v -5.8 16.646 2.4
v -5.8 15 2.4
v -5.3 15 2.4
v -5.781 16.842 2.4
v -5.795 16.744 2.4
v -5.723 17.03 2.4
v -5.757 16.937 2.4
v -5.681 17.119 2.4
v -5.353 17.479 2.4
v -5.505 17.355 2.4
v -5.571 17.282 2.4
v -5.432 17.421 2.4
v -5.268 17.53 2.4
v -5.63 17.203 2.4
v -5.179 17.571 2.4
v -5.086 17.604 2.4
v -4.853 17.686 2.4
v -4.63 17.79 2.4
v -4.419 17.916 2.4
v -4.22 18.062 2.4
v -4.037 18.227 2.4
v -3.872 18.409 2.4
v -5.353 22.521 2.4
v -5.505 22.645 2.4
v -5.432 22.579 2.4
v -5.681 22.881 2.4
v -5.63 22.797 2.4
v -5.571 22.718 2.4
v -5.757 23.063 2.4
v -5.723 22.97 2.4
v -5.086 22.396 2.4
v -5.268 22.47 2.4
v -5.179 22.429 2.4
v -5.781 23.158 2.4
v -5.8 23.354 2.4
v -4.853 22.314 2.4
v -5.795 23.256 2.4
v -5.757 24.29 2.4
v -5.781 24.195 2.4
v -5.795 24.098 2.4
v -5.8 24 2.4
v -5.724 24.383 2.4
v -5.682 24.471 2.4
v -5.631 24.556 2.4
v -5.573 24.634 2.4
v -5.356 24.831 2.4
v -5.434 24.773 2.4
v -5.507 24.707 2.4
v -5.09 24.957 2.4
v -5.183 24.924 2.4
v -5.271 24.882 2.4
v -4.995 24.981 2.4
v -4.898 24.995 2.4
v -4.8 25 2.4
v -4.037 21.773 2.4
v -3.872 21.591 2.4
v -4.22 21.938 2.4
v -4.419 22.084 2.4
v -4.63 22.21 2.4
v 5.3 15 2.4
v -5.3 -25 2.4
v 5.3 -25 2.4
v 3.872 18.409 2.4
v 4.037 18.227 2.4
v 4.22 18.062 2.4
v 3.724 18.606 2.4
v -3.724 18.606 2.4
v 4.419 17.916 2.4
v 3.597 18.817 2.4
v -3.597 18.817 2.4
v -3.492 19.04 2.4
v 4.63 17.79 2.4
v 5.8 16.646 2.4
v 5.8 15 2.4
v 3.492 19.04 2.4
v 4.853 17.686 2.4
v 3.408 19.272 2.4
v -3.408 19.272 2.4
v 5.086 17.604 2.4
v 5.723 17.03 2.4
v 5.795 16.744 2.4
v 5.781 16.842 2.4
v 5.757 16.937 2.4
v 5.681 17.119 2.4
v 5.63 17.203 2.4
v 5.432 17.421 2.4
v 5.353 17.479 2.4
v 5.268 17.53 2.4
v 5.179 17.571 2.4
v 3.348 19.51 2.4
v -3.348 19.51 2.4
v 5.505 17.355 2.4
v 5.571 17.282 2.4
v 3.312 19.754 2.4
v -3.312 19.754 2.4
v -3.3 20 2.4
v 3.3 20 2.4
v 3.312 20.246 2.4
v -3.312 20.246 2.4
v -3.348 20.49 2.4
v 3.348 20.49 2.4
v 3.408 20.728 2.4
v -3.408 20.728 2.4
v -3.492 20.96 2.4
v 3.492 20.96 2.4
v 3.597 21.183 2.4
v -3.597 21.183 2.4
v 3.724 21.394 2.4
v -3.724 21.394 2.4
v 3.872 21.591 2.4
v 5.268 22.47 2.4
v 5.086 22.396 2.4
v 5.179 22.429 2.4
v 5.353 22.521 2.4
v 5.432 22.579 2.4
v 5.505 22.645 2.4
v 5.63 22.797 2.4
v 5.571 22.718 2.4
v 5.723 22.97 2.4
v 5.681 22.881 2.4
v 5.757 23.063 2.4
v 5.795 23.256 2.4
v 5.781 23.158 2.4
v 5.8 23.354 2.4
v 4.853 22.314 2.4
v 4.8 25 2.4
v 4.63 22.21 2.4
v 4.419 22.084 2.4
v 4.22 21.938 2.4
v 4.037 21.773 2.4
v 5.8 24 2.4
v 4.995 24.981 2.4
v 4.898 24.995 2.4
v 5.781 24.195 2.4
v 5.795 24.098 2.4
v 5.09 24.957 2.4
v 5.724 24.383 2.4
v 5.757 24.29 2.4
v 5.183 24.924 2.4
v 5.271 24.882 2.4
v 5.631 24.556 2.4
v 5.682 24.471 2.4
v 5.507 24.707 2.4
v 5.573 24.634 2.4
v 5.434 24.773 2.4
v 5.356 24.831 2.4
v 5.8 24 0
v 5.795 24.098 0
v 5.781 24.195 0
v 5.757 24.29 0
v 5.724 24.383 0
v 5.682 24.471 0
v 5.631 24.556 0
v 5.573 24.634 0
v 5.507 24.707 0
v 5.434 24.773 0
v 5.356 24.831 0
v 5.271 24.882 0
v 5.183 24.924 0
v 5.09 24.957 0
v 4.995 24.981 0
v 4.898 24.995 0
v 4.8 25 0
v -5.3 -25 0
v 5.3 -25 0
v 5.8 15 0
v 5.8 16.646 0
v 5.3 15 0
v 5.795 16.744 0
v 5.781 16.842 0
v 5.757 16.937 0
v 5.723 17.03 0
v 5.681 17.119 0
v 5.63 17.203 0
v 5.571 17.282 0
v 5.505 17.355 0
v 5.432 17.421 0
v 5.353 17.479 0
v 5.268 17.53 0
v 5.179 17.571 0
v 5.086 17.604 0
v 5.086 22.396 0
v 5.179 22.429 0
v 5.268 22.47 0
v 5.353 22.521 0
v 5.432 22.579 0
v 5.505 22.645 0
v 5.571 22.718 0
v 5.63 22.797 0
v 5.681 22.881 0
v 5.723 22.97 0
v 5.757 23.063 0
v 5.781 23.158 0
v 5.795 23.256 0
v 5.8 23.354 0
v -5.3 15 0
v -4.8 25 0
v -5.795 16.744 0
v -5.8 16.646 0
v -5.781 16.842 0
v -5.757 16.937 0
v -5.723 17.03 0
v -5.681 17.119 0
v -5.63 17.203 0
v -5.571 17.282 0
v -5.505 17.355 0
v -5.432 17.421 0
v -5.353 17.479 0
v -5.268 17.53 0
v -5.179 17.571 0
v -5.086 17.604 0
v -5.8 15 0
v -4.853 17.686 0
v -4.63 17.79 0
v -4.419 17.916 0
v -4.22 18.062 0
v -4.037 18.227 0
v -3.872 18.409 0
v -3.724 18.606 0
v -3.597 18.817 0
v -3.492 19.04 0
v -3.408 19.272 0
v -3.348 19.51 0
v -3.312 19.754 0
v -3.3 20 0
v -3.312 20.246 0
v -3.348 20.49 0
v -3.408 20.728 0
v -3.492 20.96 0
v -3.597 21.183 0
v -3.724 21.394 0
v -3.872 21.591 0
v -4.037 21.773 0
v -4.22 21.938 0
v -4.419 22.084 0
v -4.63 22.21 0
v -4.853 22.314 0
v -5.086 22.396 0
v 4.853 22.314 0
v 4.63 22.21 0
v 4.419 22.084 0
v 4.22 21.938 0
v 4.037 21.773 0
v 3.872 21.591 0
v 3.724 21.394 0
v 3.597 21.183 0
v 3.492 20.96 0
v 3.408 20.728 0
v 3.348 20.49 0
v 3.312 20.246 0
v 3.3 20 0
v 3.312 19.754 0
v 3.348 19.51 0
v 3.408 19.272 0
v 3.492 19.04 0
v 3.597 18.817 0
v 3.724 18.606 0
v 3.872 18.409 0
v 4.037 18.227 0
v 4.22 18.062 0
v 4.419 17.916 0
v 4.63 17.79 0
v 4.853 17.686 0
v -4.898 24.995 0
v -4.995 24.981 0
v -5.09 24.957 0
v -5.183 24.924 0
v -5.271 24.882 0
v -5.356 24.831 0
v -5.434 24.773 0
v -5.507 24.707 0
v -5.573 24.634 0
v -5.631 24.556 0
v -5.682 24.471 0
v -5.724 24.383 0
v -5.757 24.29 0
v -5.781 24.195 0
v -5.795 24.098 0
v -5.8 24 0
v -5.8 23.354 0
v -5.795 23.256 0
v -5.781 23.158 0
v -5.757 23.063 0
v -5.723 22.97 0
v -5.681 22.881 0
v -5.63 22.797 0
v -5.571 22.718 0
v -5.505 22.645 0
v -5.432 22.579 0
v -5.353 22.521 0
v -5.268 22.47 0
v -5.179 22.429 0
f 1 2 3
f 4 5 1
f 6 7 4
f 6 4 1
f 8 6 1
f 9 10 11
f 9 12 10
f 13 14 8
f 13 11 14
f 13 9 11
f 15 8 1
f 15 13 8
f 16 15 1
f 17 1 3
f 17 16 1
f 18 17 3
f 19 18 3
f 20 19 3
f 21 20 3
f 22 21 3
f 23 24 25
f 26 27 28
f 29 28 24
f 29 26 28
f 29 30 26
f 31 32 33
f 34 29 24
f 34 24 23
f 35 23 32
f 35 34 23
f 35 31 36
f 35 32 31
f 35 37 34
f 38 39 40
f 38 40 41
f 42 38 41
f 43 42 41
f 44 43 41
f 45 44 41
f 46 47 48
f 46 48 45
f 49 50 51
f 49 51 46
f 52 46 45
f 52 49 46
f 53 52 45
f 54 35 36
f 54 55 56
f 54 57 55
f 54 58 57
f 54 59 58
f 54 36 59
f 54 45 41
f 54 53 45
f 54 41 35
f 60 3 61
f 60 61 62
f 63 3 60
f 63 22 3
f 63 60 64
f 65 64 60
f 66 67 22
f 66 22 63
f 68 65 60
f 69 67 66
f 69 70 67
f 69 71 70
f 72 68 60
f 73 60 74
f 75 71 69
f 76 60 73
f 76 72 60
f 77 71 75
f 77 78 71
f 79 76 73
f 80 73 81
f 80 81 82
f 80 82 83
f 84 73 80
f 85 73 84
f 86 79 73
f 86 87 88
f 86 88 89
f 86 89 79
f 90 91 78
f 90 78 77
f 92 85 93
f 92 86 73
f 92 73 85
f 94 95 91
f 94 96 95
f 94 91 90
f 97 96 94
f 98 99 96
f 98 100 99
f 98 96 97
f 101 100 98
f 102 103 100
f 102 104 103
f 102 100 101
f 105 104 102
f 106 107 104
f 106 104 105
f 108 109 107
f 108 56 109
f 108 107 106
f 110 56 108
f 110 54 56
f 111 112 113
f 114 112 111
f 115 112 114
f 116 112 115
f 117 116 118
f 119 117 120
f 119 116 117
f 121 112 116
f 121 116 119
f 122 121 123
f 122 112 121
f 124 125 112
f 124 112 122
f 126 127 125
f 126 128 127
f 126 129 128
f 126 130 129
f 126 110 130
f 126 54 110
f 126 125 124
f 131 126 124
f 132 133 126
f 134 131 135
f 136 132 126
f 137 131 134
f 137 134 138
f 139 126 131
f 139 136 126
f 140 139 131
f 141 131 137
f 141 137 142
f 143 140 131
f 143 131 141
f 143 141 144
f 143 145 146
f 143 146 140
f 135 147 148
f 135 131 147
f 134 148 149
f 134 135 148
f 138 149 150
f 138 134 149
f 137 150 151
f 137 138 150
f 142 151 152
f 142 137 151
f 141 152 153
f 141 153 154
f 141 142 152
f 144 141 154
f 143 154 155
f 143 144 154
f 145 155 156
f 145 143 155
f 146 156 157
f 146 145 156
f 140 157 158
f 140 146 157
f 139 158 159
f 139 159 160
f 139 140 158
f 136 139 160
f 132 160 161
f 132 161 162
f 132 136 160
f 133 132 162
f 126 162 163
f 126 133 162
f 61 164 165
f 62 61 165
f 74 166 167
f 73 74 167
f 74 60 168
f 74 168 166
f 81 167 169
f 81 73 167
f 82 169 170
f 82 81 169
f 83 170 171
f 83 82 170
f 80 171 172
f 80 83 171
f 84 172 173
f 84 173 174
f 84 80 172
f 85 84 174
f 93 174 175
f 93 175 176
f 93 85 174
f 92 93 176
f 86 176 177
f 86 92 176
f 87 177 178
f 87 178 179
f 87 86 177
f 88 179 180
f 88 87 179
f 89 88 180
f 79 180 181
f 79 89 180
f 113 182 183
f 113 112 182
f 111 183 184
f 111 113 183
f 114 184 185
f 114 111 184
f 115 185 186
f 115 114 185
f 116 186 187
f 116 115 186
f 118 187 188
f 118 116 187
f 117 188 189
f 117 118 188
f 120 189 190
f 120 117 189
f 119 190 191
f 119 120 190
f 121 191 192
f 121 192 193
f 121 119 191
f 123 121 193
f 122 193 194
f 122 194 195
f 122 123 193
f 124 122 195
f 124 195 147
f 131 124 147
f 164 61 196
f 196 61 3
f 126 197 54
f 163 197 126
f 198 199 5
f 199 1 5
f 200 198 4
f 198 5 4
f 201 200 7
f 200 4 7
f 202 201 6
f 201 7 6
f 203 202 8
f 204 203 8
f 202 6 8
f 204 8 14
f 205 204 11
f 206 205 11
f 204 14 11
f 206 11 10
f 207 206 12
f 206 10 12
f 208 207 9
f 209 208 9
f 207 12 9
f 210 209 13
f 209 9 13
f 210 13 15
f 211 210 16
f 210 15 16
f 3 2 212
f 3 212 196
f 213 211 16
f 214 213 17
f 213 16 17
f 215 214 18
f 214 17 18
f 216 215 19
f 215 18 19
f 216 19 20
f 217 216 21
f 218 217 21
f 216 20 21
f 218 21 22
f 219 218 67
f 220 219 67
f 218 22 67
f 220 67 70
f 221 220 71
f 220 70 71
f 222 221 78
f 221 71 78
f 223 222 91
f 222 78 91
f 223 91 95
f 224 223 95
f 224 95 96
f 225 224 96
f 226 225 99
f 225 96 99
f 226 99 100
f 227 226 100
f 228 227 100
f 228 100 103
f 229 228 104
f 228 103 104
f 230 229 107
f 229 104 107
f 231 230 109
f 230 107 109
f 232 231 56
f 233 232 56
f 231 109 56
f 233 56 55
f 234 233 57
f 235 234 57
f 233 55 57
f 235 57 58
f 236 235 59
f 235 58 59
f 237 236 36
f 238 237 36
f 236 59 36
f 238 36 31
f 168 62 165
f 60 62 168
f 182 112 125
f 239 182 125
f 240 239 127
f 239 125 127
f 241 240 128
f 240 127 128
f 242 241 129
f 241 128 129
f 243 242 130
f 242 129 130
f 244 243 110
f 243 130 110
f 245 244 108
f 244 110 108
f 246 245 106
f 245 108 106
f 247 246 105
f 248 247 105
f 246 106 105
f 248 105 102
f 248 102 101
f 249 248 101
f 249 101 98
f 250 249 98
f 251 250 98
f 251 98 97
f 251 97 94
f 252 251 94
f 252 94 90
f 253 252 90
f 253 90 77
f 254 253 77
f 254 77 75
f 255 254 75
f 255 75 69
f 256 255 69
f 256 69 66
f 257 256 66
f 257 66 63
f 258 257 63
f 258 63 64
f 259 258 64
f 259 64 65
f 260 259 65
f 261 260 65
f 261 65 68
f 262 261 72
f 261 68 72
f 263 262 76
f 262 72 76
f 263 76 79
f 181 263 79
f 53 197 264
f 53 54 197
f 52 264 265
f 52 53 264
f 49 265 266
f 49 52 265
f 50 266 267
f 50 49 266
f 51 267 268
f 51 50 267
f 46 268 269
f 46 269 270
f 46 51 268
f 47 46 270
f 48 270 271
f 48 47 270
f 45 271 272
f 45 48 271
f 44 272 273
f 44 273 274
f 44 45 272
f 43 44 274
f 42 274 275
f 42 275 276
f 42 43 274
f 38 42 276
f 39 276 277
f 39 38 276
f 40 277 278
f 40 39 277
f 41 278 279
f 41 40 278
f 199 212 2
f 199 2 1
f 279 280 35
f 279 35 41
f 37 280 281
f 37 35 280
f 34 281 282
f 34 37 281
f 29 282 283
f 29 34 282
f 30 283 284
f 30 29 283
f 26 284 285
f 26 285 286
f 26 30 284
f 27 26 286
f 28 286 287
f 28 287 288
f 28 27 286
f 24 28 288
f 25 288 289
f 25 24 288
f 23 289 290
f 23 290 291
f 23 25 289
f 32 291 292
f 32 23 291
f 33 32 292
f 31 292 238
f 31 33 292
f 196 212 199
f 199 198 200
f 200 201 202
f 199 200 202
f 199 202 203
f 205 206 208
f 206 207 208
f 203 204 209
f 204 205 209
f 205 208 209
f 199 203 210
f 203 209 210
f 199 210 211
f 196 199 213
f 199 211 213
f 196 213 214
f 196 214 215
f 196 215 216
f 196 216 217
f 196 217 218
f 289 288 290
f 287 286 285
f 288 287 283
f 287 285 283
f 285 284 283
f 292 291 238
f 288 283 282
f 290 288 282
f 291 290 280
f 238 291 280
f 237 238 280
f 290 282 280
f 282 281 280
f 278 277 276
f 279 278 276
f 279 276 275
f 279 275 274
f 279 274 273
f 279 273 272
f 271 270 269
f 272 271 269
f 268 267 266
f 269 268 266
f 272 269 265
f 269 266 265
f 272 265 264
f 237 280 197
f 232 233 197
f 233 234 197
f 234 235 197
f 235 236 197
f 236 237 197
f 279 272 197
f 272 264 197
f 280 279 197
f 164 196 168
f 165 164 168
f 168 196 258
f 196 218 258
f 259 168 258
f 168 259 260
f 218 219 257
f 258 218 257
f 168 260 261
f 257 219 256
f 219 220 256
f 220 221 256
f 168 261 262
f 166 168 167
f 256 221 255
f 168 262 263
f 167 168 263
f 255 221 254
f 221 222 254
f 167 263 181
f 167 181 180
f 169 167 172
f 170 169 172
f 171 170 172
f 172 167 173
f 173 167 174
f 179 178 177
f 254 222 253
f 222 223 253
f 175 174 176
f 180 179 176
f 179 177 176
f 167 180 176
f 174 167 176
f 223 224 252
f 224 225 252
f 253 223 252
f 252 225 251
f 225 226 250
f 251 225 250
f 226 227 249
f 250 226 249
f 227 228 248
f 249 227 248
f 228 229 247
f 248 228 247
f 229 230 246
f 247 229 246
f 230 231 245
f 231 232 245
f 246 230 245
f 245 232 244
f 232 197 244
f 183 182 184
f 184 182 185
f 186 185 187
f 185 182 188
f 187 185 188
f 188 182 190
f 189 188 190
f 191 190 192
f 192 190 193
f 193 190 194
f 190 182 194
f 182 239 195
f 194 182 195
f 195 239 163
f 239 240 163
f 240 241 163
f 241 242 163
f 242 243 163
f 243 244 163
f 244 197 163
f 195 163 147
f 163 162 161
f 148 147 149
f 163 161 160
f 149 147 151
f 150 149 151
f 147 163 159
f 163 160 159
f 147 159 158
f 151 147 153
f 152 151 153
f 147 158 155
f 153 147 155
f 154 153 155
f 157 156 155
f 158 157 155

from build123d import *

# Parameters (mm, degrees)
F0_W     = 11.6
F0_H     = 50
F1_DEPTH = 2.4
F2_R     = 2.5
F2_W     = 0.5
F2_H     = 40
F3_DEPTH = 25
F4_R     = 1


with BuildPart() as f1:
    # F0 (on Top) → F1 (new body)
    with BuildSketch(Plane.XY):
        Rectangle(F0_W, F0_H)
    extrude(amount=F1_DEPTH)

    # F2 (on face) → F3 (cut)
    with BuildSketch(Plane.XY.offset(2.4)):
        with Locations((5.8, 20)):
            Circle(F2_R)
        with Locations((5.55, -5)):
            Rectangle(F2_W, F2_H)
        with Locations((-5.8, 20)):
            Circle(F2_R)
        with Locations((-5.55, -5)):
            Rectangle(F2_W, F2_H)
    extrude(amount=-F3_DEPTH, mode=Mode.SUBTRACT)

    # F4
    f4_edges = [f1.edges().sort_by_distance(p)[0] for p in [
        (5.8, 22.5, 1.2),
        (5.8, 17.5, 1.2),
        (-5.8, 22.5, 1.2),
        (-5.8, 17.5, 1.2),
        (5.8, 25, 1.2),
        (-5.8, 25, 1.2),
    ]]
    fillet(f4_edges, radius=F4_R)


solid = f1.part
